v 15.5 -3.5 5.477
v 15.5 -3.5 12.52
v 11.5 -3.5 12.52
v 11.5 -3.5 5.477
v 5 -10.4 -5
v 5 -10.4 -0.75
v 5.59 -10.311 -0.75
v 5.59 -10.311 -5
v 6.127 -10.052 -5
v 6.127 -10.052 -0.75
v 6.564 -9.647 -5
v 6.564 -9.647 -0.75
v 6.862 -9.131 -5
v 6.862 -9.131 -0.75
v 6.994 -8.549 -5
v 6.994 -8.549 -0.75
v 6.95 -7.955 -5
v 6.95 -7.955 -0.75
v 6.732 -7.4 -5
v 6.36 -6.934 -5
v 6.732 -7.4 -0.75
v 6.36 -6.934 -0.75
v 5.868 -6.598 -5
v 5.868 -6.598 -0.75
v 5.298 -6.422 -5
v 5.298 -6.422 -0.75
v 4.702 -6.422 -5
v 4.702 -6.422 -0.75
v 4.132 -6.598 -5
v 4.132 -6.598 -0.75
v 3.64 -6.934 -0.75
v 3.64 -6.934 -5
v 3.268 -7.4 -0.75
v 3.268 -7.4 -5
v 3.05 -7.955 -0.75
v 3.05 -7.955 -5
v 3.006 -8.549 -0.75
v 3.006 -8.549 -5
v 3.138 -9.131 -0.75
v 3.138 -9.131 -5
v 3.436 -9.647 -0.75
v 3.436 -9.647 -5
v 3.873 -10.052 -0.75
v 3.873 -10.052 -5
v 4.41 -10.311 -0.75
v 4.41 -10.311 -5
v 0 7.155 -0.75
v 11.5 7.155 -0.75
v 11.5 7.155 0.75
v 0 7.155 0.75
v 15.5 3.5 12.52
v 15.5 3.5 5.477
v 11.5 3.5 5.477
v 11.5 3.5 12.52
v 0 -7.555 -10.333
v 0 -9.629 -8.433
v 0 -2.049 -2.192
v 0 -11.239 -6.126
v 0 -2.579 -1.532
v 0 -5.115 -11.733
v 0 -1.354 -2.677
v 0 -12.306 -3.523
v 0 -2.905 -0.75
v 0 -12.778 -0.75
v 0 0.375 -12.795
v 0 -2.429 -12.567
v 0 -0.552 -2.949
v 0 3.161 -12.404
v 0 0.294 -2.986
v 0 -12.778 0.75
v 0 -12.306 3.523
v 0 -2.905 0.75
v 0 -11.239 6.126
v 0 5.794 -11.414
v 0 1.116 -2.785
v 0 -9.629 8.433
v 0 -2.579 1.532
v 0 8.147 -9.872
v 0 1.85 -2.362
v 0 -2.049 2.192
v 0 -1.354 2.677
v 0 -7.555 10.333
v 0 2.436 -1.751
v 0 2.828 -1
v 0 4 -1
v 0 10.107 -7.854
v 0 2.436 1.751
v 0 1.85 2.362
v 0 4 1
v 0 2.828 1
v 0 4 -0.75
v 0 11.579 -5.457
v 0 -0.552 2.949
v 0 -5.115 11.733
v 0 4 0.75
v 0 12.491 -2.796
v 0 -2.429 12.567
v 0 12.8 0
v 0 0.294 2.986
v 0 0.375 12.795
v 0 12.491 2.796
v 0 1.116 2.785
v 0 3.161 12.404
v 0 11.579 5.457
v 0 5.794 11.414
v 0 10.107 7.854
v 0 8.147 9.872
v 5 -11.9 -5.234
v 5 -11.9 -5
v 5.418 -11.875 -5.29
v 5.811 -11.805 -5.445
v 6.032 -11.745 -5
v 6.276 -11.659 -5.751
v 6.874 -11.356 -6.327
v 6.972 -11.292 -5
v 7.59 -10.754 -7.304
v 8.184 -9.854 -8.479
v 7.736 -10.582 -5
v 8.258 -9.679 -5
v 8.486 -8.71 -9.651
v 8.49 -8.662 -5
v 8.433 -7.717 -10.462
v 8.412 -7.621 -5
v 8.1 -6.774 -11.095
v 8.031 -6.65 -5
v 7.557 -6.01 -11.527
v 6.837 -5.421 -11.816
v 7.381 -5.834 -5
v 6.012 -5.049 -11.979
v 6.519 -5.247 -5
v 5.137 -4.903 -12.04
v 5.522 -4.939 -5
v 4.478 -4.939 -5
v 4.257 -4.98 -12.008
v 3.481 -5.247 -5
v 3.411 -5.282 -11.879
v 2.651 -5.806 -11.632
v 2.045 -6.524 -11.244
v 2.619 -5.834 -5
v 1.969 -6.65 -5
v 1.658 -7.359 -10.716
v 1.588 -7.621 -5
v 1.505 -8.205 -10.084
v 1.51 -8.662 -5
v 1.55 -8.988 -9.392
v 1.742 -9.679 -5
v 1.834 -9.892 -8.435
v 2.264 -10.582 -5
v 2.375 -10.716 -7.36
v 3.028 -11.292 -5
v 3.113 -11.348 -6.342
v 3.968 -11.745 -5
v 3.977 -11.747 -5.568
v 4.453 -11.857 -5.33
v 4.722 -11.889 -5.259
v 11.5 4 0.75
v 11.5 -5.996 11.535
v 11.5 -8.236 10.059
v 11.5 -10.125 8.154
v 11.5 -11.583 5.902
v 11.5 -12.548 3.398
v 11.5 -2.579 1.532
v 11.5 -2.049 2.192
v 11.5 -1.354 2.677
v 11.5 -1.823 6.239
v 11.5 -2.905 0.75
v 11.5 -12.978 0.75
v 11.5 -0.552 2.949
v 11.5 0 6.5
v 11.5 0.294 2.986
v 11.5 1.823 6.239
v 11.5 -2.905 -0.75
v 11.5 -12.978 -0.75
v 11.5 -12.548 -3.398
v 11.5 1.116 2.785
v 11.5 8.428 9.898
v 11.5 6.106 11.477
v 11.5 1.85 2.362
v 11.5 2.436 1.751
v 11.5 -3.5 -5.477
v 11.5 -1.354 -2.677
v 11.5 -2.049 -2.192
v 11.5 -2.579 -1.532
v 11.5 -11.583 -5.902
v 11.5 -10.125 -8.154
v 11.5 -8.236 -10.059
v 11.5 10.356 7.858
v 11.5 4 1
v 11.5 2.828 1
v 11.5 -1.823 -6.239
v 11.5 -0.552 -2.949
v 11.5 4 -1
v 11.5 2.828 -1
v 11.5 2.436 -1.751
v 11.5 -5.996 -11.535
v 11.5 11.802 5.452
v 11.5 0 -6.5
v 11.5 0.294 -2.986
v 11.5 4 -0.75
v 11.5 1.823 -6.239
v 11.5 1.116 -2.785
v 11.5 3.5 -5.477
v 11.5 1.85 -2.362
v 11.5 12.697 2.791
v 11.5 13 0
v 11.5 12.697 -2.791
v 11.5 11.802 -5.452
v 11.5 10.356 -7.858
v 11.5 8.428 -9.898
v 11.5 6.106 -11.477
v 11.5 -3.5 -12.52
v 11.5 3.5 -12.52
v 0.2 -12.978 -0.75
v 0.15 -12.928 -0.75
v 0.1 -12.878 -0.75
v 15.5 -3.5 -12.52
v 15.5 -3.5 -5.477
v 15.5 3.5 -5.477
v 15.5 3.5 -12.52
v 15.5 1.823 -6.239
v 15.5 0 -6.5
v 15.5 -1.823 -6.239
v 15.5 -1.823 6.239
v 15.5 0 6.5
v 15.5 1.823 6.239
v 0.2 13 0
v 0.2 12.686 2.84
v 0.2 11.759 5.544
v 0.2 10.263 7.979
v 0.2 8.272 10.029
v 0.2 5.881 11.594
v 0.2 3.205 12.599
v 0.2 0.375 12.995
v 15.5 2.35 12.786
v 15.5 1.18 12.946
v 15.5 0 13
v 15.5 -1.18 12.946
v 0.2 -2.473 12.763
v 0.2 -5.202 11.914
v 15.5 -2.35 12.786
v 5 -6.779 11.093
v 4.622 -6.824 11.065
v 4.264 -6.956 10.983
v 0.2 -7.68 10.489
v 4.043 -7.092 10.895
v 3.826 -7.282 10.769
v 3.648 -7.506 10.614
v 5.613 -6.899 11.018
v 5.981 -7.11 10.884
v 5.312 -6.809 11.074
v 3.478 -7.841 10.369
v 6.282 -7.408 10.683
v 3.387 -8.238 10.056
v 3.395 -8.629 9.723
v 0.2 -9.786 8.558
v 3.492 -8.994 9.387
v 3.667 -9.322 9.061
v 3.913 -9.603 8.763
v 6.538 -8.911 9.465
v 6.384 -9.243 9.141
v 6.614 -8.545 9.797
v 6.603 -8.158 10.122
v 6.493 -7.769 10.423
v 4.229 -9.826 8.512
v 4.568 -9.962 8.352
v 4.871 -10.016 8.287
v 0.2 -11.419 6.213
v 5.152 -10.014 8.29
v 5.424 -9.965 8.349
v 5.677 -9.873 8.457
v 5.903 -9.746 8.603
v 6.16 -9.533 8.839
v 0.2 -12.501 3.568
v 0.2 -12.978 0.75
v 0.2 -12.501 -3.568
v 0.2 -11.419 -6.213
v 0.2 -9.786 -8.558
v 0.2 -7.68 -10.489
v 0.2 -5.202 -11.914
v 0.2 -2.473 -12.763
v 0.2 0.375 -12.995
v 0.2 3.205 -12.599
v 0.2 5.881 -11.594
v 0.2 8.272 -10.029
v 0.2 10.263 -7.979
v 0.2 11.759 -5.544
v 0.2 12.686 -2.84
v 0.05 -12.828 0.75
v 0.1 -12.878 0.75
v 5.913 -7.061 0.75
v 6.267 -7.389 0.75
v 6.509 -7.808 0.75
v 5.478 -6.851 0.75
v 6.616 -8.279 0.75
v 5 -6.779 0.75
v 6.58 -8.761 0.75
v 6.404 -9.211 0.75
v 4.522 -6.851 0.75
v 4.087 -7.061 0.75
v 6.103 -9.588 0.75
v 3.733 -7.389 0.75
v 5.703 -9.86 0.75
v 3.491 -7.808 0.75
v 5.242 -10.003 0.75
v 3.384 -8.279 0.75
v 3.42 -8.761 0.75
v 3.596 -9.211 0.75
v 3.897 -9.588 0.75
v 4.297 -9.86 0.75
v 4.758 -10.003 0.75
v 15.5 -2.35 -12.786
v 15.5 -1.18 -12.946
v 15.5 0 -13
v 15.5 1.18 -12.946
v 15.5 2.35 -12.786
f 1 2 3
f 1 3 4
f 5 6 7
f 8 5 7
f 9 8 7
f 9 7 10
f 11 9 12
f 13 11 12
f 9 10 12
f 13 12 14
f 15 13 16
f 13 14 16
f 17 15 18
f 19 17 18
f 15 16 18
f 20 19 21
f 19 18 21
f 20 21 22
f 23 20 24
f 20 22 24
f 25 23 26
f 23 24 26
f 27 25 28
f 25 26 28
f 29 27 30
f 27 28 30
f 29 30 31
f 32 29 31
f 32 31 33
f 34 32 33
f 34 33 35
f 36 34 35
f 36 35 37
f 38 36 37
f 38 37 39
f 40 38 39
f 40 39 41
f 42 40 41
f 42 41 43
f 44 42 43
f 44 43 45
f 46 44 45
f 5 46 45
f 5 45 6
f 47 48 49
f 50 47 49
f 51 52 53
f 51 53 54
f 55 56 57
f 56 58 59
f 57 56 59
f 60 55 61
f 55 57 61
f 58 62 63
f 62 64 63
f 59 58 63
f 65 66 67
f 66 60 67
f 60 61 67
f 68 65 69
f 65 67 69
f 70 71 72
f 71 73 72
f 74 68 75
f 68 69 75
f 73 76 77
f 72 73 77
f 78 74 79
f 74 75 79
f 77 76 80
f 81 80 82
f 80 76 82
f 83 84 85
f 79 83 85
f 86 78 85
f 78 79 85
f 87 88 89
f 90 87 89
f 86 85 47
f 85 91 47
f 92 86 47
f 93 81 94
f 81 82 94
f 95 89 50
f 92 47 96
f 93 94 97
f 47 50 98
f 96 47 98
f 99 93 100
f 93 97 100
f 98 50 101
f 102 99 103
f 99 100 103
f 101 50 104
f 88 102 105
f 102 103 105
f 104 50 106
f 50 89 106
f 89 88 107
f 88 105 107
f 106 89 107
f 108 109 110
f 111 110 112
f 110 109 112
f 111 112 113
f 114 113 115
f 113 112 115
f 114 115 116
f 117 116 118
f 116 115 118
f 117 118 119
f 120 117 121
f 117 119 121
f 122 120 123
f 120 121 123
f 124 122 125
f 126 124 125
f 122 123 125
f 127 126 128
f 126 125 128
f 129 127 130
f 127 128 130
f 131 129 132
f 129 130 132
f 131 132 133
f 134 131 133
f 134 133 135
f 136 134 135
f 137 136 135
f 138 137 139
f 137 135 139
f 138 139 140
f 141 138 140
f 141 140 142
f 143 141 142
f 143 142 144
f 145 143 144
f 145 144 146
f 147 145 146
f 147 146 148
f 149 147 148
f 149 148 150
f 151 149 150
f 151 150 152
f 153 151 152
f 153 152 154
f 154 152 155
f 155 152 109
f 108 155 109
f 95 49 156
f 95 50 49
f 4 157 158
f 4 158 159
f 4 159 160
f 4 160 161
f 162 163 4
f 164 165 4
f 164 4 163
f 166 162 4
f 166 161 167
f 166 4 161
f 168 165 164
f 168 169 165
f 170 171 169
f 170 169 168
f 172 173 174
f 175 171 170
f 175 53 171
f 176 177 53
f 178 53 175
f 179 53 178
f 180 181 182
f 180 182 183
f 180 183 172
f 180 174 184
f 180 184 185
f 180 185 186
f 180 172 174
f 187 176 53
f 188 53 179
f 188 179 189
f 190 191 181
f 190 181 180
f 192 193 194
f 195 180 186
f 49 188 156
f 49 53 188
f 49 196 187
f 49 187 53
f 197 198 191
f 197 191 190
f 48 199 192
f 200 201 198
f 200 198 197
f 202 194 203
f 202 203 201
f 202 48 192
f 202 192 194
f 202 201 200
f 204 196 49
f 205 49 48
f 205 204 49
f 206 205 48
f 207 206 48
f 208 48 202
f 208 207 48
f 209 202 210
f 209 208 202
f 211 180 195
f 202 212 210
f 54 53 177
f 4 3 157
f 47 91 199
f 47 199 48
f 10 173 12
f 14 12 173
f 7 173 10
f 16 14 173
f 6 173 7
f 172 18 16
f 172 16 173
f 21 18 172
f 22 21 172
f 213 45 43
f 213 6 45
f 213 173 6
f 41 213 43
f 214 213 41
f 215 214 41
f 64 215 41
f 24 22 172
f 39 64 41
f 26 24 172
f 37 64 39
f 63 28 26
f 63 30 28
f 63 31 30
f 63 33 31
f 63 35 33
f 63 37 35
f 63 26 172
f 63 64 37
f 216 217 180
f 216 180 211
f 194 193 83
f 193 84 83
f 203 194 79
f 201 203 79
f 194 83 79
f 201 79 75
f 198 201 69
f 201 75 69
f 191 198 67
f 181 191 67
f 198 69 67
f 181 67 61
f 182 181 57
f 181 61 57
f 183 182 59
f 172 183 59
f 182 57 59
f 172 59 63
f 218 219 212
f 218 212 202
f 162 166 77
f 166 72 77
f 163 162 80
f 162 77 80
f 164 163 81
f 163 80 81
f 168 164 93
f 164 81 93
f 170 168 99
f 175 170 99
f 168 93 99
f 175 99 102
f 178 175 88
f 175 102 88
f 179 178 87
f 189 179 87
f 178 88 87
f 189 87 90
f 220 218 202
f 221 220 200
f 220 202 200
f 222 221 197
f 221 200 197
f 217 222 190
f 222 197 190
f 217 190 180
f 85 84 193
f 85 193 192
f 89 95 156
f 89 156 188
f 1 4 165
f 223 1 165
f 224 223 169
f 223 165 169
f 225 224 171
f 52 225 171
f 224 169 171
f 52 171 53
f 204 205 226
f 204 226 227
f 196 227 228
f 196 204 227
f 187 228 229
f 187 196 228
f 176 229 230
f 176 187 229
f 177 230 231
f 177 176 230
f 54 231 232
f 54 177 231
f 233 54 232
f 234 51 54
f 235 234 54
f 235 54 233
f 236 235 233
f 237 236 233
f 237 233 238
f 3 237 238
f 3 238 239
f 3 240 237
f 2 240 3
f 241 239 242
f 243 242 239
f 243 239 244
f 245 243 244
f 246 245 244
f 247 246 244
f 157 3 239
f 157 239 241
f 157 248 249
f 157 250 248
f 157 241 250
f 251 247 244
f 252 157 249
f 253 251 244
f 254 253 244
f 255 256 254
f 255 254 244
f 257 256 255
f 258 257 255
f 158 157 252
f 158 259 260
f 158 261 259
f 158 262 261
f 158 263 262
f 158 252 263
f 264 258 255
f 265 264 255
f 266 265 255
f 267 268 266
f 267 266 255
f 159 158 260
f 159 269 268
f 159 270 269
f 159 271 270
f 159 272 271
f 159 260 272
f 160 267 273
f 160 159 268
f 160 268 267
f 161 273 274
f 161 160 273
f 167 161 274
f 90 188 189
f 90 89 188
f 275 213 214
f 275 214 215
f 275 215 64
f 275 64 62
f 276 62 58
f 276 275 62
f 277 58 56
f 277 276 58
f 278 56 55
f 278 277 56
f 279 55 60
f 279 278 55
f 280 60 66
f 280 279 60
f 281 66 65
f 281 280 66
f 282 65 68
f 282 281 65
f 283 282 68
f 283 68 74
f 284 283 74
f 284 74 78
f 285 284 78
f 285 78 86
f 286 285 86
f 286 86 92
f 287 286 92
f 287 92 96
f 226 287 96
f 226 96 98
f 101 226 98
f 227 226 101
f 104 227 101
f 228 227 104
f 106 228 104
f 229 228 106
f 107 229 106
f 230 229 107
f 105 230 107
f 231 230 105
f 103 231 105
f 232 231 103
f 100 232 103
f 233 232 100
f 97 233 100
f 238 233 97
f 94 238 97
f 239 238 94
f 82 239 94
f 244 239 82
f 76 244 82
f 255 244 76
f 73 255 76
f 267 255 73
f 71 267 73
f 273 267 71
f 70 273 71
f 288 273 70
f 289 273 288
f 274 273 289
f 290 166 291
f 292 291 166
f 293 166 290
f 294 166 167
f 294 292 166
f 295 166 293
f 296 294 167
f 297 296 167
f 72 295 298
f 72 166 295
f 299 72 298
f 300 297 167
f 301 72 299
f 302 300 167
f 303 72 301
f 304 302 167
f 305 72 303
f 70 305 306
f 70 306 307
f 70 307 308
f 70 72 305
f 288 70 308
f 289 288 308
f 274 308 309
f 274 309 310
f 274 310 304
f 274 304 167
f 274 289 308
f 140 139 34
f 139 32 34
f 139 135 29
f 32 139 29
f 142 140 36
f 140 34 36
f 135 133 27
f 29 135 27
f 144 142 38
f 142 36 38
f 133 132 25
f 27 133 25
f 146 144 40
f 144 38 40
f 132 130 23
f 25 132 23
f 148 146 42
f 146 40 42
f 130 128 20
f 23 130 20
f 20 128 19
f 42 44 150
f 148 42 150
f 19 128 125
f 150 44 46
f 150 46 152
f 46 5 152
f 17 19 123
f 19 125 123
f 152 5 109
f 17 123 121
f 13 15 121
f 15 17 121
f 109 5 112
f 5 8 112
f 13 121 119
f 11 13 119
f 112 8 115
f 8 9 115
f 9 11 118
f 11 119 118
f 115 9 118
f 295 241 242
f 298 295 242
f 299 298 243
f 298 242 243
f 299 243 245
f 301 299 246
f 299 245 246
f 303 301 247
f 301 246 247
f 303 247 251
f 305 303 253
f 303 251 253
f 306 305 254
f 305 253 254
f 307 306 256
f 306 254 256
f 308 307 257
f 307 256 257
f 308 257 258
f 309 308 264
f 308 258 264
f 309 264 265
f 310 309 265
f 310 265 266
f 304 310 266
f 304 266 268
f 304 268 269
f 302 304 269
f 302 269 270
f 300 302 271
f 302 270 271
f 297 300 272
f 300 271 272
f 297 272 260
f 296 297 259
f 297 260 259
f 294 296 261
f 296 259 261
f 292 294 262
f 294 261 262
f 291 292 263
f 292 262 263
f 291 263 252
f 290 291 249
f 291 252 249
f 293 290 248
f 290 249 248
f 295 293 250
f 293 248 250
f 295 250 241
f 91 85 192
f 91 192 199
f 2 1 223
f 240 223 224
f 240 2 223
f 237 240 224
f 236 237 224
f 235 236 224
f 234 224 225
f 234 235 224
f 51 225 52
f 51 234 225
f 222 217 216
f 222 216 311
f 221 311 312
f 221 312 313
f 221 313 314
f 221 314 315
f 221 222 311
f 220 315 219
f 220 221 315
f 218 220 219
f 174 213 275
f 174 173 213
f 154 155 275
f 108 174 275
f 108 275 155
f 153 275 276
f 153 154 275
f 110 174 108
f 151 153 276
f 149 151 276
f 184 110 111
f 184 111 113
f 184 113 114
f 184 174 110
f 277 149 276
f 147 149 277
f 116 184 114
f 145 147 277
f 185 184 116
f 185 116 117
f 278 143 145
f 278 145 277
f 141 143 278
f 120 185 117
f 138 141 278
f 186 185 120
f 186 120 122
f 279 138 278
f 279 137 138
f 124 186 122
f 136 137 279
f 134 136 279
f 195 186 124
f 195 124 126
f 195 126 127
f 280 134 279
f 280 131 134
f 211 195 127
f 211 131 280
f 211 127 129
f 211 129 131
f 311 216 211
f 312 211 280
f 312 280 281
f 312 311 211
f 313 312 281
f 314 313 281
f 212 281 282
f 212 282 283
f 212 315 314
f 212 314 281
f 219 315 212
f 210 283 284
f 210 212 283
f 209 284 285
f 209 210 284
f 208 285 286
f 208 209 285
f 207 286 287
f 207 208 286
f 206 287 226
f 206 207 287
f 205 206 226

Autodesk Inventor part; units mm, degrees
sketch "Sketch_1" plane through (0, 0, 0) normal (0, 0, 1) x (1, 0, 0)
  line L0 (15.5, 0) -> (0, 0)
  line L1 (0, 0) -> (0, 12.8)
  line L2 (0, 12.8) -> (0.2, 13)
  line L3 (0.2, 13) -> (15.5, 13)
  line L4 (15.5, 13) -> (15.5, 0)
  line L5 (15.5, 0) -> (0, 0)
revolve "Revolution1" add sketch "Sketch_1" angle 360 about axis through (15.5, 0, 0) along (1, 0, 0)
sketch "Sketch_6" plane through (0, 0, 0) normal (1, 0, 0) x (0, 1, 0)
  line L0 (-13, 0.75) -> (-13, -0.75)
  line L1 (-13, -0.75) -> (0, -0.75)
  line L2 (0, -0.75) -> (0, 0.75)
  line L3 (0, 0.75) -> (-13, 0.75)
extrude "Extrusion1" cut sketch "Sketch_6" along normal blind 11.5
sketch "Sketch_7" plane through (5, 0, 0) normal (1, 0, 0) x (0, 0, -1)
  line L0 (-13, -8.4) -> (13, -8.4)
  line L1 (13, -8.4) -> (13, -11.9)
  line L2 (13, -11.9) -> (5, -11.9)
  line L3 (5, -11.9) -> (5, -10.4)
  line L4 (5, -10.4) -> (0.75, -10.4)
  line L5 (0.75, -10.4) -> (0.75, -8.4)
  line L6 (0.75, -8.4) -> (13, -8.4)
revolve "Revolution2" cut sketch "Sketch_7" angle 360 about axis through (5, -8.4, 13) along (0, 0, 1)
sketch "Sketch4" plane through (11.5, 0, 0.75) normal (0, 0, -1) x (-1, 0, 0)
  point P0 (6.5, -8.4)
hole "Hole1" at (5, -8.4, 0.75) direction (0, 0, 1) diameter 3.242 depth 12.25 thread size "M4x0.7" class "6H" standard "ISO Metric profile"
sketch "Sketch_2" plane through (15.5, 0, 0) normal (1, 0, 0) x (0, 0, -1)
  line L0 (-14, -13.5) -> (14, -13.5)
  line L1 (14, -13.5) -> (14, 13.5)
  line L2 (14, 13.5) -> (-14, 13.5)
  line L3 (-14, 13.5) -> (-14, -13.5)
  line L4 (-13, -3.5) -> (13, -3.5)
  line L5 (13, -3.5) -> (13, 3.5)
  line L6 (13, 3.5) -> (-13, 3.5)
  line L7 (-13, 3.5) -> (-13, -3.5)
extrude "Extrusion2" cut sketch "Sketch_2" against normal blind 4
sketch "Sketch6" plane through (15.5, 0, 0) normal (1, 0, 0) x (0, 0, -1)
  point P0 (0, 0)
hole "Hole2" at (15.5, 0, 0) direction (-1, 0, 0) diameter 13 depth 4
sketch "Sketch_15" plane through (11.5, 0, 0) normal (1, 0, 0) x (0, 0, -1)
  arc A0 (-1, 2.8284) -> (1, 2.8284) centre (0, 0) ccw
  line L0 (1, 2.8284) -> (1, 4)
  line L1 (1, 4) -> (-1, 4)
  line L2 (-1, 4) -> (-1, 2.8284)
extrude "Extrusion3" cut sketch "Sketch_15" along normal mid plane 31
sketch "Sketch_8" plane through (0, 0, 0) normal (1, 0, 0) x (0, 1, 0)
  line L0 (7.155, 0.75) -> (0, 0.75)
  line L1 (0, 0.75) -> (0, -0.75)
  line L2 (0, -0.75) -> (7.155, -0.75)
  line L3 (7.155, -0.75) -> (7.155, 0.75)
extrude "Extrusion4" cut sketch "Sketch_8" along normal blind 15.5
ref_plane "L_XY" through (15.2, 0, 0) normal (1, 0, 0) x (0, 0, -1)
ref_plane "L_YZ" through (15.2, 0, 0) normal (0, 0, -1) x (0, 1, 0)
ref_plane "L_ZX" through (15.2, 0, 0) normal (0, 1, 0) x (1, 0, 0)
ref_plane "screw_XY" through (5, -8.4, -5) normal (0, 0, -1) x (1, 0, 0)
ref_plane "screw_YZ" through (5, -8.4, -5) normal (1, 0, 0) x (0, -1, 0)
ref_plane "screw_ZX" through (5, -8.4, -5) normal (0, -1, 0) x (0, 0, -1)
properties part number "MCOCWK26-6_c"
